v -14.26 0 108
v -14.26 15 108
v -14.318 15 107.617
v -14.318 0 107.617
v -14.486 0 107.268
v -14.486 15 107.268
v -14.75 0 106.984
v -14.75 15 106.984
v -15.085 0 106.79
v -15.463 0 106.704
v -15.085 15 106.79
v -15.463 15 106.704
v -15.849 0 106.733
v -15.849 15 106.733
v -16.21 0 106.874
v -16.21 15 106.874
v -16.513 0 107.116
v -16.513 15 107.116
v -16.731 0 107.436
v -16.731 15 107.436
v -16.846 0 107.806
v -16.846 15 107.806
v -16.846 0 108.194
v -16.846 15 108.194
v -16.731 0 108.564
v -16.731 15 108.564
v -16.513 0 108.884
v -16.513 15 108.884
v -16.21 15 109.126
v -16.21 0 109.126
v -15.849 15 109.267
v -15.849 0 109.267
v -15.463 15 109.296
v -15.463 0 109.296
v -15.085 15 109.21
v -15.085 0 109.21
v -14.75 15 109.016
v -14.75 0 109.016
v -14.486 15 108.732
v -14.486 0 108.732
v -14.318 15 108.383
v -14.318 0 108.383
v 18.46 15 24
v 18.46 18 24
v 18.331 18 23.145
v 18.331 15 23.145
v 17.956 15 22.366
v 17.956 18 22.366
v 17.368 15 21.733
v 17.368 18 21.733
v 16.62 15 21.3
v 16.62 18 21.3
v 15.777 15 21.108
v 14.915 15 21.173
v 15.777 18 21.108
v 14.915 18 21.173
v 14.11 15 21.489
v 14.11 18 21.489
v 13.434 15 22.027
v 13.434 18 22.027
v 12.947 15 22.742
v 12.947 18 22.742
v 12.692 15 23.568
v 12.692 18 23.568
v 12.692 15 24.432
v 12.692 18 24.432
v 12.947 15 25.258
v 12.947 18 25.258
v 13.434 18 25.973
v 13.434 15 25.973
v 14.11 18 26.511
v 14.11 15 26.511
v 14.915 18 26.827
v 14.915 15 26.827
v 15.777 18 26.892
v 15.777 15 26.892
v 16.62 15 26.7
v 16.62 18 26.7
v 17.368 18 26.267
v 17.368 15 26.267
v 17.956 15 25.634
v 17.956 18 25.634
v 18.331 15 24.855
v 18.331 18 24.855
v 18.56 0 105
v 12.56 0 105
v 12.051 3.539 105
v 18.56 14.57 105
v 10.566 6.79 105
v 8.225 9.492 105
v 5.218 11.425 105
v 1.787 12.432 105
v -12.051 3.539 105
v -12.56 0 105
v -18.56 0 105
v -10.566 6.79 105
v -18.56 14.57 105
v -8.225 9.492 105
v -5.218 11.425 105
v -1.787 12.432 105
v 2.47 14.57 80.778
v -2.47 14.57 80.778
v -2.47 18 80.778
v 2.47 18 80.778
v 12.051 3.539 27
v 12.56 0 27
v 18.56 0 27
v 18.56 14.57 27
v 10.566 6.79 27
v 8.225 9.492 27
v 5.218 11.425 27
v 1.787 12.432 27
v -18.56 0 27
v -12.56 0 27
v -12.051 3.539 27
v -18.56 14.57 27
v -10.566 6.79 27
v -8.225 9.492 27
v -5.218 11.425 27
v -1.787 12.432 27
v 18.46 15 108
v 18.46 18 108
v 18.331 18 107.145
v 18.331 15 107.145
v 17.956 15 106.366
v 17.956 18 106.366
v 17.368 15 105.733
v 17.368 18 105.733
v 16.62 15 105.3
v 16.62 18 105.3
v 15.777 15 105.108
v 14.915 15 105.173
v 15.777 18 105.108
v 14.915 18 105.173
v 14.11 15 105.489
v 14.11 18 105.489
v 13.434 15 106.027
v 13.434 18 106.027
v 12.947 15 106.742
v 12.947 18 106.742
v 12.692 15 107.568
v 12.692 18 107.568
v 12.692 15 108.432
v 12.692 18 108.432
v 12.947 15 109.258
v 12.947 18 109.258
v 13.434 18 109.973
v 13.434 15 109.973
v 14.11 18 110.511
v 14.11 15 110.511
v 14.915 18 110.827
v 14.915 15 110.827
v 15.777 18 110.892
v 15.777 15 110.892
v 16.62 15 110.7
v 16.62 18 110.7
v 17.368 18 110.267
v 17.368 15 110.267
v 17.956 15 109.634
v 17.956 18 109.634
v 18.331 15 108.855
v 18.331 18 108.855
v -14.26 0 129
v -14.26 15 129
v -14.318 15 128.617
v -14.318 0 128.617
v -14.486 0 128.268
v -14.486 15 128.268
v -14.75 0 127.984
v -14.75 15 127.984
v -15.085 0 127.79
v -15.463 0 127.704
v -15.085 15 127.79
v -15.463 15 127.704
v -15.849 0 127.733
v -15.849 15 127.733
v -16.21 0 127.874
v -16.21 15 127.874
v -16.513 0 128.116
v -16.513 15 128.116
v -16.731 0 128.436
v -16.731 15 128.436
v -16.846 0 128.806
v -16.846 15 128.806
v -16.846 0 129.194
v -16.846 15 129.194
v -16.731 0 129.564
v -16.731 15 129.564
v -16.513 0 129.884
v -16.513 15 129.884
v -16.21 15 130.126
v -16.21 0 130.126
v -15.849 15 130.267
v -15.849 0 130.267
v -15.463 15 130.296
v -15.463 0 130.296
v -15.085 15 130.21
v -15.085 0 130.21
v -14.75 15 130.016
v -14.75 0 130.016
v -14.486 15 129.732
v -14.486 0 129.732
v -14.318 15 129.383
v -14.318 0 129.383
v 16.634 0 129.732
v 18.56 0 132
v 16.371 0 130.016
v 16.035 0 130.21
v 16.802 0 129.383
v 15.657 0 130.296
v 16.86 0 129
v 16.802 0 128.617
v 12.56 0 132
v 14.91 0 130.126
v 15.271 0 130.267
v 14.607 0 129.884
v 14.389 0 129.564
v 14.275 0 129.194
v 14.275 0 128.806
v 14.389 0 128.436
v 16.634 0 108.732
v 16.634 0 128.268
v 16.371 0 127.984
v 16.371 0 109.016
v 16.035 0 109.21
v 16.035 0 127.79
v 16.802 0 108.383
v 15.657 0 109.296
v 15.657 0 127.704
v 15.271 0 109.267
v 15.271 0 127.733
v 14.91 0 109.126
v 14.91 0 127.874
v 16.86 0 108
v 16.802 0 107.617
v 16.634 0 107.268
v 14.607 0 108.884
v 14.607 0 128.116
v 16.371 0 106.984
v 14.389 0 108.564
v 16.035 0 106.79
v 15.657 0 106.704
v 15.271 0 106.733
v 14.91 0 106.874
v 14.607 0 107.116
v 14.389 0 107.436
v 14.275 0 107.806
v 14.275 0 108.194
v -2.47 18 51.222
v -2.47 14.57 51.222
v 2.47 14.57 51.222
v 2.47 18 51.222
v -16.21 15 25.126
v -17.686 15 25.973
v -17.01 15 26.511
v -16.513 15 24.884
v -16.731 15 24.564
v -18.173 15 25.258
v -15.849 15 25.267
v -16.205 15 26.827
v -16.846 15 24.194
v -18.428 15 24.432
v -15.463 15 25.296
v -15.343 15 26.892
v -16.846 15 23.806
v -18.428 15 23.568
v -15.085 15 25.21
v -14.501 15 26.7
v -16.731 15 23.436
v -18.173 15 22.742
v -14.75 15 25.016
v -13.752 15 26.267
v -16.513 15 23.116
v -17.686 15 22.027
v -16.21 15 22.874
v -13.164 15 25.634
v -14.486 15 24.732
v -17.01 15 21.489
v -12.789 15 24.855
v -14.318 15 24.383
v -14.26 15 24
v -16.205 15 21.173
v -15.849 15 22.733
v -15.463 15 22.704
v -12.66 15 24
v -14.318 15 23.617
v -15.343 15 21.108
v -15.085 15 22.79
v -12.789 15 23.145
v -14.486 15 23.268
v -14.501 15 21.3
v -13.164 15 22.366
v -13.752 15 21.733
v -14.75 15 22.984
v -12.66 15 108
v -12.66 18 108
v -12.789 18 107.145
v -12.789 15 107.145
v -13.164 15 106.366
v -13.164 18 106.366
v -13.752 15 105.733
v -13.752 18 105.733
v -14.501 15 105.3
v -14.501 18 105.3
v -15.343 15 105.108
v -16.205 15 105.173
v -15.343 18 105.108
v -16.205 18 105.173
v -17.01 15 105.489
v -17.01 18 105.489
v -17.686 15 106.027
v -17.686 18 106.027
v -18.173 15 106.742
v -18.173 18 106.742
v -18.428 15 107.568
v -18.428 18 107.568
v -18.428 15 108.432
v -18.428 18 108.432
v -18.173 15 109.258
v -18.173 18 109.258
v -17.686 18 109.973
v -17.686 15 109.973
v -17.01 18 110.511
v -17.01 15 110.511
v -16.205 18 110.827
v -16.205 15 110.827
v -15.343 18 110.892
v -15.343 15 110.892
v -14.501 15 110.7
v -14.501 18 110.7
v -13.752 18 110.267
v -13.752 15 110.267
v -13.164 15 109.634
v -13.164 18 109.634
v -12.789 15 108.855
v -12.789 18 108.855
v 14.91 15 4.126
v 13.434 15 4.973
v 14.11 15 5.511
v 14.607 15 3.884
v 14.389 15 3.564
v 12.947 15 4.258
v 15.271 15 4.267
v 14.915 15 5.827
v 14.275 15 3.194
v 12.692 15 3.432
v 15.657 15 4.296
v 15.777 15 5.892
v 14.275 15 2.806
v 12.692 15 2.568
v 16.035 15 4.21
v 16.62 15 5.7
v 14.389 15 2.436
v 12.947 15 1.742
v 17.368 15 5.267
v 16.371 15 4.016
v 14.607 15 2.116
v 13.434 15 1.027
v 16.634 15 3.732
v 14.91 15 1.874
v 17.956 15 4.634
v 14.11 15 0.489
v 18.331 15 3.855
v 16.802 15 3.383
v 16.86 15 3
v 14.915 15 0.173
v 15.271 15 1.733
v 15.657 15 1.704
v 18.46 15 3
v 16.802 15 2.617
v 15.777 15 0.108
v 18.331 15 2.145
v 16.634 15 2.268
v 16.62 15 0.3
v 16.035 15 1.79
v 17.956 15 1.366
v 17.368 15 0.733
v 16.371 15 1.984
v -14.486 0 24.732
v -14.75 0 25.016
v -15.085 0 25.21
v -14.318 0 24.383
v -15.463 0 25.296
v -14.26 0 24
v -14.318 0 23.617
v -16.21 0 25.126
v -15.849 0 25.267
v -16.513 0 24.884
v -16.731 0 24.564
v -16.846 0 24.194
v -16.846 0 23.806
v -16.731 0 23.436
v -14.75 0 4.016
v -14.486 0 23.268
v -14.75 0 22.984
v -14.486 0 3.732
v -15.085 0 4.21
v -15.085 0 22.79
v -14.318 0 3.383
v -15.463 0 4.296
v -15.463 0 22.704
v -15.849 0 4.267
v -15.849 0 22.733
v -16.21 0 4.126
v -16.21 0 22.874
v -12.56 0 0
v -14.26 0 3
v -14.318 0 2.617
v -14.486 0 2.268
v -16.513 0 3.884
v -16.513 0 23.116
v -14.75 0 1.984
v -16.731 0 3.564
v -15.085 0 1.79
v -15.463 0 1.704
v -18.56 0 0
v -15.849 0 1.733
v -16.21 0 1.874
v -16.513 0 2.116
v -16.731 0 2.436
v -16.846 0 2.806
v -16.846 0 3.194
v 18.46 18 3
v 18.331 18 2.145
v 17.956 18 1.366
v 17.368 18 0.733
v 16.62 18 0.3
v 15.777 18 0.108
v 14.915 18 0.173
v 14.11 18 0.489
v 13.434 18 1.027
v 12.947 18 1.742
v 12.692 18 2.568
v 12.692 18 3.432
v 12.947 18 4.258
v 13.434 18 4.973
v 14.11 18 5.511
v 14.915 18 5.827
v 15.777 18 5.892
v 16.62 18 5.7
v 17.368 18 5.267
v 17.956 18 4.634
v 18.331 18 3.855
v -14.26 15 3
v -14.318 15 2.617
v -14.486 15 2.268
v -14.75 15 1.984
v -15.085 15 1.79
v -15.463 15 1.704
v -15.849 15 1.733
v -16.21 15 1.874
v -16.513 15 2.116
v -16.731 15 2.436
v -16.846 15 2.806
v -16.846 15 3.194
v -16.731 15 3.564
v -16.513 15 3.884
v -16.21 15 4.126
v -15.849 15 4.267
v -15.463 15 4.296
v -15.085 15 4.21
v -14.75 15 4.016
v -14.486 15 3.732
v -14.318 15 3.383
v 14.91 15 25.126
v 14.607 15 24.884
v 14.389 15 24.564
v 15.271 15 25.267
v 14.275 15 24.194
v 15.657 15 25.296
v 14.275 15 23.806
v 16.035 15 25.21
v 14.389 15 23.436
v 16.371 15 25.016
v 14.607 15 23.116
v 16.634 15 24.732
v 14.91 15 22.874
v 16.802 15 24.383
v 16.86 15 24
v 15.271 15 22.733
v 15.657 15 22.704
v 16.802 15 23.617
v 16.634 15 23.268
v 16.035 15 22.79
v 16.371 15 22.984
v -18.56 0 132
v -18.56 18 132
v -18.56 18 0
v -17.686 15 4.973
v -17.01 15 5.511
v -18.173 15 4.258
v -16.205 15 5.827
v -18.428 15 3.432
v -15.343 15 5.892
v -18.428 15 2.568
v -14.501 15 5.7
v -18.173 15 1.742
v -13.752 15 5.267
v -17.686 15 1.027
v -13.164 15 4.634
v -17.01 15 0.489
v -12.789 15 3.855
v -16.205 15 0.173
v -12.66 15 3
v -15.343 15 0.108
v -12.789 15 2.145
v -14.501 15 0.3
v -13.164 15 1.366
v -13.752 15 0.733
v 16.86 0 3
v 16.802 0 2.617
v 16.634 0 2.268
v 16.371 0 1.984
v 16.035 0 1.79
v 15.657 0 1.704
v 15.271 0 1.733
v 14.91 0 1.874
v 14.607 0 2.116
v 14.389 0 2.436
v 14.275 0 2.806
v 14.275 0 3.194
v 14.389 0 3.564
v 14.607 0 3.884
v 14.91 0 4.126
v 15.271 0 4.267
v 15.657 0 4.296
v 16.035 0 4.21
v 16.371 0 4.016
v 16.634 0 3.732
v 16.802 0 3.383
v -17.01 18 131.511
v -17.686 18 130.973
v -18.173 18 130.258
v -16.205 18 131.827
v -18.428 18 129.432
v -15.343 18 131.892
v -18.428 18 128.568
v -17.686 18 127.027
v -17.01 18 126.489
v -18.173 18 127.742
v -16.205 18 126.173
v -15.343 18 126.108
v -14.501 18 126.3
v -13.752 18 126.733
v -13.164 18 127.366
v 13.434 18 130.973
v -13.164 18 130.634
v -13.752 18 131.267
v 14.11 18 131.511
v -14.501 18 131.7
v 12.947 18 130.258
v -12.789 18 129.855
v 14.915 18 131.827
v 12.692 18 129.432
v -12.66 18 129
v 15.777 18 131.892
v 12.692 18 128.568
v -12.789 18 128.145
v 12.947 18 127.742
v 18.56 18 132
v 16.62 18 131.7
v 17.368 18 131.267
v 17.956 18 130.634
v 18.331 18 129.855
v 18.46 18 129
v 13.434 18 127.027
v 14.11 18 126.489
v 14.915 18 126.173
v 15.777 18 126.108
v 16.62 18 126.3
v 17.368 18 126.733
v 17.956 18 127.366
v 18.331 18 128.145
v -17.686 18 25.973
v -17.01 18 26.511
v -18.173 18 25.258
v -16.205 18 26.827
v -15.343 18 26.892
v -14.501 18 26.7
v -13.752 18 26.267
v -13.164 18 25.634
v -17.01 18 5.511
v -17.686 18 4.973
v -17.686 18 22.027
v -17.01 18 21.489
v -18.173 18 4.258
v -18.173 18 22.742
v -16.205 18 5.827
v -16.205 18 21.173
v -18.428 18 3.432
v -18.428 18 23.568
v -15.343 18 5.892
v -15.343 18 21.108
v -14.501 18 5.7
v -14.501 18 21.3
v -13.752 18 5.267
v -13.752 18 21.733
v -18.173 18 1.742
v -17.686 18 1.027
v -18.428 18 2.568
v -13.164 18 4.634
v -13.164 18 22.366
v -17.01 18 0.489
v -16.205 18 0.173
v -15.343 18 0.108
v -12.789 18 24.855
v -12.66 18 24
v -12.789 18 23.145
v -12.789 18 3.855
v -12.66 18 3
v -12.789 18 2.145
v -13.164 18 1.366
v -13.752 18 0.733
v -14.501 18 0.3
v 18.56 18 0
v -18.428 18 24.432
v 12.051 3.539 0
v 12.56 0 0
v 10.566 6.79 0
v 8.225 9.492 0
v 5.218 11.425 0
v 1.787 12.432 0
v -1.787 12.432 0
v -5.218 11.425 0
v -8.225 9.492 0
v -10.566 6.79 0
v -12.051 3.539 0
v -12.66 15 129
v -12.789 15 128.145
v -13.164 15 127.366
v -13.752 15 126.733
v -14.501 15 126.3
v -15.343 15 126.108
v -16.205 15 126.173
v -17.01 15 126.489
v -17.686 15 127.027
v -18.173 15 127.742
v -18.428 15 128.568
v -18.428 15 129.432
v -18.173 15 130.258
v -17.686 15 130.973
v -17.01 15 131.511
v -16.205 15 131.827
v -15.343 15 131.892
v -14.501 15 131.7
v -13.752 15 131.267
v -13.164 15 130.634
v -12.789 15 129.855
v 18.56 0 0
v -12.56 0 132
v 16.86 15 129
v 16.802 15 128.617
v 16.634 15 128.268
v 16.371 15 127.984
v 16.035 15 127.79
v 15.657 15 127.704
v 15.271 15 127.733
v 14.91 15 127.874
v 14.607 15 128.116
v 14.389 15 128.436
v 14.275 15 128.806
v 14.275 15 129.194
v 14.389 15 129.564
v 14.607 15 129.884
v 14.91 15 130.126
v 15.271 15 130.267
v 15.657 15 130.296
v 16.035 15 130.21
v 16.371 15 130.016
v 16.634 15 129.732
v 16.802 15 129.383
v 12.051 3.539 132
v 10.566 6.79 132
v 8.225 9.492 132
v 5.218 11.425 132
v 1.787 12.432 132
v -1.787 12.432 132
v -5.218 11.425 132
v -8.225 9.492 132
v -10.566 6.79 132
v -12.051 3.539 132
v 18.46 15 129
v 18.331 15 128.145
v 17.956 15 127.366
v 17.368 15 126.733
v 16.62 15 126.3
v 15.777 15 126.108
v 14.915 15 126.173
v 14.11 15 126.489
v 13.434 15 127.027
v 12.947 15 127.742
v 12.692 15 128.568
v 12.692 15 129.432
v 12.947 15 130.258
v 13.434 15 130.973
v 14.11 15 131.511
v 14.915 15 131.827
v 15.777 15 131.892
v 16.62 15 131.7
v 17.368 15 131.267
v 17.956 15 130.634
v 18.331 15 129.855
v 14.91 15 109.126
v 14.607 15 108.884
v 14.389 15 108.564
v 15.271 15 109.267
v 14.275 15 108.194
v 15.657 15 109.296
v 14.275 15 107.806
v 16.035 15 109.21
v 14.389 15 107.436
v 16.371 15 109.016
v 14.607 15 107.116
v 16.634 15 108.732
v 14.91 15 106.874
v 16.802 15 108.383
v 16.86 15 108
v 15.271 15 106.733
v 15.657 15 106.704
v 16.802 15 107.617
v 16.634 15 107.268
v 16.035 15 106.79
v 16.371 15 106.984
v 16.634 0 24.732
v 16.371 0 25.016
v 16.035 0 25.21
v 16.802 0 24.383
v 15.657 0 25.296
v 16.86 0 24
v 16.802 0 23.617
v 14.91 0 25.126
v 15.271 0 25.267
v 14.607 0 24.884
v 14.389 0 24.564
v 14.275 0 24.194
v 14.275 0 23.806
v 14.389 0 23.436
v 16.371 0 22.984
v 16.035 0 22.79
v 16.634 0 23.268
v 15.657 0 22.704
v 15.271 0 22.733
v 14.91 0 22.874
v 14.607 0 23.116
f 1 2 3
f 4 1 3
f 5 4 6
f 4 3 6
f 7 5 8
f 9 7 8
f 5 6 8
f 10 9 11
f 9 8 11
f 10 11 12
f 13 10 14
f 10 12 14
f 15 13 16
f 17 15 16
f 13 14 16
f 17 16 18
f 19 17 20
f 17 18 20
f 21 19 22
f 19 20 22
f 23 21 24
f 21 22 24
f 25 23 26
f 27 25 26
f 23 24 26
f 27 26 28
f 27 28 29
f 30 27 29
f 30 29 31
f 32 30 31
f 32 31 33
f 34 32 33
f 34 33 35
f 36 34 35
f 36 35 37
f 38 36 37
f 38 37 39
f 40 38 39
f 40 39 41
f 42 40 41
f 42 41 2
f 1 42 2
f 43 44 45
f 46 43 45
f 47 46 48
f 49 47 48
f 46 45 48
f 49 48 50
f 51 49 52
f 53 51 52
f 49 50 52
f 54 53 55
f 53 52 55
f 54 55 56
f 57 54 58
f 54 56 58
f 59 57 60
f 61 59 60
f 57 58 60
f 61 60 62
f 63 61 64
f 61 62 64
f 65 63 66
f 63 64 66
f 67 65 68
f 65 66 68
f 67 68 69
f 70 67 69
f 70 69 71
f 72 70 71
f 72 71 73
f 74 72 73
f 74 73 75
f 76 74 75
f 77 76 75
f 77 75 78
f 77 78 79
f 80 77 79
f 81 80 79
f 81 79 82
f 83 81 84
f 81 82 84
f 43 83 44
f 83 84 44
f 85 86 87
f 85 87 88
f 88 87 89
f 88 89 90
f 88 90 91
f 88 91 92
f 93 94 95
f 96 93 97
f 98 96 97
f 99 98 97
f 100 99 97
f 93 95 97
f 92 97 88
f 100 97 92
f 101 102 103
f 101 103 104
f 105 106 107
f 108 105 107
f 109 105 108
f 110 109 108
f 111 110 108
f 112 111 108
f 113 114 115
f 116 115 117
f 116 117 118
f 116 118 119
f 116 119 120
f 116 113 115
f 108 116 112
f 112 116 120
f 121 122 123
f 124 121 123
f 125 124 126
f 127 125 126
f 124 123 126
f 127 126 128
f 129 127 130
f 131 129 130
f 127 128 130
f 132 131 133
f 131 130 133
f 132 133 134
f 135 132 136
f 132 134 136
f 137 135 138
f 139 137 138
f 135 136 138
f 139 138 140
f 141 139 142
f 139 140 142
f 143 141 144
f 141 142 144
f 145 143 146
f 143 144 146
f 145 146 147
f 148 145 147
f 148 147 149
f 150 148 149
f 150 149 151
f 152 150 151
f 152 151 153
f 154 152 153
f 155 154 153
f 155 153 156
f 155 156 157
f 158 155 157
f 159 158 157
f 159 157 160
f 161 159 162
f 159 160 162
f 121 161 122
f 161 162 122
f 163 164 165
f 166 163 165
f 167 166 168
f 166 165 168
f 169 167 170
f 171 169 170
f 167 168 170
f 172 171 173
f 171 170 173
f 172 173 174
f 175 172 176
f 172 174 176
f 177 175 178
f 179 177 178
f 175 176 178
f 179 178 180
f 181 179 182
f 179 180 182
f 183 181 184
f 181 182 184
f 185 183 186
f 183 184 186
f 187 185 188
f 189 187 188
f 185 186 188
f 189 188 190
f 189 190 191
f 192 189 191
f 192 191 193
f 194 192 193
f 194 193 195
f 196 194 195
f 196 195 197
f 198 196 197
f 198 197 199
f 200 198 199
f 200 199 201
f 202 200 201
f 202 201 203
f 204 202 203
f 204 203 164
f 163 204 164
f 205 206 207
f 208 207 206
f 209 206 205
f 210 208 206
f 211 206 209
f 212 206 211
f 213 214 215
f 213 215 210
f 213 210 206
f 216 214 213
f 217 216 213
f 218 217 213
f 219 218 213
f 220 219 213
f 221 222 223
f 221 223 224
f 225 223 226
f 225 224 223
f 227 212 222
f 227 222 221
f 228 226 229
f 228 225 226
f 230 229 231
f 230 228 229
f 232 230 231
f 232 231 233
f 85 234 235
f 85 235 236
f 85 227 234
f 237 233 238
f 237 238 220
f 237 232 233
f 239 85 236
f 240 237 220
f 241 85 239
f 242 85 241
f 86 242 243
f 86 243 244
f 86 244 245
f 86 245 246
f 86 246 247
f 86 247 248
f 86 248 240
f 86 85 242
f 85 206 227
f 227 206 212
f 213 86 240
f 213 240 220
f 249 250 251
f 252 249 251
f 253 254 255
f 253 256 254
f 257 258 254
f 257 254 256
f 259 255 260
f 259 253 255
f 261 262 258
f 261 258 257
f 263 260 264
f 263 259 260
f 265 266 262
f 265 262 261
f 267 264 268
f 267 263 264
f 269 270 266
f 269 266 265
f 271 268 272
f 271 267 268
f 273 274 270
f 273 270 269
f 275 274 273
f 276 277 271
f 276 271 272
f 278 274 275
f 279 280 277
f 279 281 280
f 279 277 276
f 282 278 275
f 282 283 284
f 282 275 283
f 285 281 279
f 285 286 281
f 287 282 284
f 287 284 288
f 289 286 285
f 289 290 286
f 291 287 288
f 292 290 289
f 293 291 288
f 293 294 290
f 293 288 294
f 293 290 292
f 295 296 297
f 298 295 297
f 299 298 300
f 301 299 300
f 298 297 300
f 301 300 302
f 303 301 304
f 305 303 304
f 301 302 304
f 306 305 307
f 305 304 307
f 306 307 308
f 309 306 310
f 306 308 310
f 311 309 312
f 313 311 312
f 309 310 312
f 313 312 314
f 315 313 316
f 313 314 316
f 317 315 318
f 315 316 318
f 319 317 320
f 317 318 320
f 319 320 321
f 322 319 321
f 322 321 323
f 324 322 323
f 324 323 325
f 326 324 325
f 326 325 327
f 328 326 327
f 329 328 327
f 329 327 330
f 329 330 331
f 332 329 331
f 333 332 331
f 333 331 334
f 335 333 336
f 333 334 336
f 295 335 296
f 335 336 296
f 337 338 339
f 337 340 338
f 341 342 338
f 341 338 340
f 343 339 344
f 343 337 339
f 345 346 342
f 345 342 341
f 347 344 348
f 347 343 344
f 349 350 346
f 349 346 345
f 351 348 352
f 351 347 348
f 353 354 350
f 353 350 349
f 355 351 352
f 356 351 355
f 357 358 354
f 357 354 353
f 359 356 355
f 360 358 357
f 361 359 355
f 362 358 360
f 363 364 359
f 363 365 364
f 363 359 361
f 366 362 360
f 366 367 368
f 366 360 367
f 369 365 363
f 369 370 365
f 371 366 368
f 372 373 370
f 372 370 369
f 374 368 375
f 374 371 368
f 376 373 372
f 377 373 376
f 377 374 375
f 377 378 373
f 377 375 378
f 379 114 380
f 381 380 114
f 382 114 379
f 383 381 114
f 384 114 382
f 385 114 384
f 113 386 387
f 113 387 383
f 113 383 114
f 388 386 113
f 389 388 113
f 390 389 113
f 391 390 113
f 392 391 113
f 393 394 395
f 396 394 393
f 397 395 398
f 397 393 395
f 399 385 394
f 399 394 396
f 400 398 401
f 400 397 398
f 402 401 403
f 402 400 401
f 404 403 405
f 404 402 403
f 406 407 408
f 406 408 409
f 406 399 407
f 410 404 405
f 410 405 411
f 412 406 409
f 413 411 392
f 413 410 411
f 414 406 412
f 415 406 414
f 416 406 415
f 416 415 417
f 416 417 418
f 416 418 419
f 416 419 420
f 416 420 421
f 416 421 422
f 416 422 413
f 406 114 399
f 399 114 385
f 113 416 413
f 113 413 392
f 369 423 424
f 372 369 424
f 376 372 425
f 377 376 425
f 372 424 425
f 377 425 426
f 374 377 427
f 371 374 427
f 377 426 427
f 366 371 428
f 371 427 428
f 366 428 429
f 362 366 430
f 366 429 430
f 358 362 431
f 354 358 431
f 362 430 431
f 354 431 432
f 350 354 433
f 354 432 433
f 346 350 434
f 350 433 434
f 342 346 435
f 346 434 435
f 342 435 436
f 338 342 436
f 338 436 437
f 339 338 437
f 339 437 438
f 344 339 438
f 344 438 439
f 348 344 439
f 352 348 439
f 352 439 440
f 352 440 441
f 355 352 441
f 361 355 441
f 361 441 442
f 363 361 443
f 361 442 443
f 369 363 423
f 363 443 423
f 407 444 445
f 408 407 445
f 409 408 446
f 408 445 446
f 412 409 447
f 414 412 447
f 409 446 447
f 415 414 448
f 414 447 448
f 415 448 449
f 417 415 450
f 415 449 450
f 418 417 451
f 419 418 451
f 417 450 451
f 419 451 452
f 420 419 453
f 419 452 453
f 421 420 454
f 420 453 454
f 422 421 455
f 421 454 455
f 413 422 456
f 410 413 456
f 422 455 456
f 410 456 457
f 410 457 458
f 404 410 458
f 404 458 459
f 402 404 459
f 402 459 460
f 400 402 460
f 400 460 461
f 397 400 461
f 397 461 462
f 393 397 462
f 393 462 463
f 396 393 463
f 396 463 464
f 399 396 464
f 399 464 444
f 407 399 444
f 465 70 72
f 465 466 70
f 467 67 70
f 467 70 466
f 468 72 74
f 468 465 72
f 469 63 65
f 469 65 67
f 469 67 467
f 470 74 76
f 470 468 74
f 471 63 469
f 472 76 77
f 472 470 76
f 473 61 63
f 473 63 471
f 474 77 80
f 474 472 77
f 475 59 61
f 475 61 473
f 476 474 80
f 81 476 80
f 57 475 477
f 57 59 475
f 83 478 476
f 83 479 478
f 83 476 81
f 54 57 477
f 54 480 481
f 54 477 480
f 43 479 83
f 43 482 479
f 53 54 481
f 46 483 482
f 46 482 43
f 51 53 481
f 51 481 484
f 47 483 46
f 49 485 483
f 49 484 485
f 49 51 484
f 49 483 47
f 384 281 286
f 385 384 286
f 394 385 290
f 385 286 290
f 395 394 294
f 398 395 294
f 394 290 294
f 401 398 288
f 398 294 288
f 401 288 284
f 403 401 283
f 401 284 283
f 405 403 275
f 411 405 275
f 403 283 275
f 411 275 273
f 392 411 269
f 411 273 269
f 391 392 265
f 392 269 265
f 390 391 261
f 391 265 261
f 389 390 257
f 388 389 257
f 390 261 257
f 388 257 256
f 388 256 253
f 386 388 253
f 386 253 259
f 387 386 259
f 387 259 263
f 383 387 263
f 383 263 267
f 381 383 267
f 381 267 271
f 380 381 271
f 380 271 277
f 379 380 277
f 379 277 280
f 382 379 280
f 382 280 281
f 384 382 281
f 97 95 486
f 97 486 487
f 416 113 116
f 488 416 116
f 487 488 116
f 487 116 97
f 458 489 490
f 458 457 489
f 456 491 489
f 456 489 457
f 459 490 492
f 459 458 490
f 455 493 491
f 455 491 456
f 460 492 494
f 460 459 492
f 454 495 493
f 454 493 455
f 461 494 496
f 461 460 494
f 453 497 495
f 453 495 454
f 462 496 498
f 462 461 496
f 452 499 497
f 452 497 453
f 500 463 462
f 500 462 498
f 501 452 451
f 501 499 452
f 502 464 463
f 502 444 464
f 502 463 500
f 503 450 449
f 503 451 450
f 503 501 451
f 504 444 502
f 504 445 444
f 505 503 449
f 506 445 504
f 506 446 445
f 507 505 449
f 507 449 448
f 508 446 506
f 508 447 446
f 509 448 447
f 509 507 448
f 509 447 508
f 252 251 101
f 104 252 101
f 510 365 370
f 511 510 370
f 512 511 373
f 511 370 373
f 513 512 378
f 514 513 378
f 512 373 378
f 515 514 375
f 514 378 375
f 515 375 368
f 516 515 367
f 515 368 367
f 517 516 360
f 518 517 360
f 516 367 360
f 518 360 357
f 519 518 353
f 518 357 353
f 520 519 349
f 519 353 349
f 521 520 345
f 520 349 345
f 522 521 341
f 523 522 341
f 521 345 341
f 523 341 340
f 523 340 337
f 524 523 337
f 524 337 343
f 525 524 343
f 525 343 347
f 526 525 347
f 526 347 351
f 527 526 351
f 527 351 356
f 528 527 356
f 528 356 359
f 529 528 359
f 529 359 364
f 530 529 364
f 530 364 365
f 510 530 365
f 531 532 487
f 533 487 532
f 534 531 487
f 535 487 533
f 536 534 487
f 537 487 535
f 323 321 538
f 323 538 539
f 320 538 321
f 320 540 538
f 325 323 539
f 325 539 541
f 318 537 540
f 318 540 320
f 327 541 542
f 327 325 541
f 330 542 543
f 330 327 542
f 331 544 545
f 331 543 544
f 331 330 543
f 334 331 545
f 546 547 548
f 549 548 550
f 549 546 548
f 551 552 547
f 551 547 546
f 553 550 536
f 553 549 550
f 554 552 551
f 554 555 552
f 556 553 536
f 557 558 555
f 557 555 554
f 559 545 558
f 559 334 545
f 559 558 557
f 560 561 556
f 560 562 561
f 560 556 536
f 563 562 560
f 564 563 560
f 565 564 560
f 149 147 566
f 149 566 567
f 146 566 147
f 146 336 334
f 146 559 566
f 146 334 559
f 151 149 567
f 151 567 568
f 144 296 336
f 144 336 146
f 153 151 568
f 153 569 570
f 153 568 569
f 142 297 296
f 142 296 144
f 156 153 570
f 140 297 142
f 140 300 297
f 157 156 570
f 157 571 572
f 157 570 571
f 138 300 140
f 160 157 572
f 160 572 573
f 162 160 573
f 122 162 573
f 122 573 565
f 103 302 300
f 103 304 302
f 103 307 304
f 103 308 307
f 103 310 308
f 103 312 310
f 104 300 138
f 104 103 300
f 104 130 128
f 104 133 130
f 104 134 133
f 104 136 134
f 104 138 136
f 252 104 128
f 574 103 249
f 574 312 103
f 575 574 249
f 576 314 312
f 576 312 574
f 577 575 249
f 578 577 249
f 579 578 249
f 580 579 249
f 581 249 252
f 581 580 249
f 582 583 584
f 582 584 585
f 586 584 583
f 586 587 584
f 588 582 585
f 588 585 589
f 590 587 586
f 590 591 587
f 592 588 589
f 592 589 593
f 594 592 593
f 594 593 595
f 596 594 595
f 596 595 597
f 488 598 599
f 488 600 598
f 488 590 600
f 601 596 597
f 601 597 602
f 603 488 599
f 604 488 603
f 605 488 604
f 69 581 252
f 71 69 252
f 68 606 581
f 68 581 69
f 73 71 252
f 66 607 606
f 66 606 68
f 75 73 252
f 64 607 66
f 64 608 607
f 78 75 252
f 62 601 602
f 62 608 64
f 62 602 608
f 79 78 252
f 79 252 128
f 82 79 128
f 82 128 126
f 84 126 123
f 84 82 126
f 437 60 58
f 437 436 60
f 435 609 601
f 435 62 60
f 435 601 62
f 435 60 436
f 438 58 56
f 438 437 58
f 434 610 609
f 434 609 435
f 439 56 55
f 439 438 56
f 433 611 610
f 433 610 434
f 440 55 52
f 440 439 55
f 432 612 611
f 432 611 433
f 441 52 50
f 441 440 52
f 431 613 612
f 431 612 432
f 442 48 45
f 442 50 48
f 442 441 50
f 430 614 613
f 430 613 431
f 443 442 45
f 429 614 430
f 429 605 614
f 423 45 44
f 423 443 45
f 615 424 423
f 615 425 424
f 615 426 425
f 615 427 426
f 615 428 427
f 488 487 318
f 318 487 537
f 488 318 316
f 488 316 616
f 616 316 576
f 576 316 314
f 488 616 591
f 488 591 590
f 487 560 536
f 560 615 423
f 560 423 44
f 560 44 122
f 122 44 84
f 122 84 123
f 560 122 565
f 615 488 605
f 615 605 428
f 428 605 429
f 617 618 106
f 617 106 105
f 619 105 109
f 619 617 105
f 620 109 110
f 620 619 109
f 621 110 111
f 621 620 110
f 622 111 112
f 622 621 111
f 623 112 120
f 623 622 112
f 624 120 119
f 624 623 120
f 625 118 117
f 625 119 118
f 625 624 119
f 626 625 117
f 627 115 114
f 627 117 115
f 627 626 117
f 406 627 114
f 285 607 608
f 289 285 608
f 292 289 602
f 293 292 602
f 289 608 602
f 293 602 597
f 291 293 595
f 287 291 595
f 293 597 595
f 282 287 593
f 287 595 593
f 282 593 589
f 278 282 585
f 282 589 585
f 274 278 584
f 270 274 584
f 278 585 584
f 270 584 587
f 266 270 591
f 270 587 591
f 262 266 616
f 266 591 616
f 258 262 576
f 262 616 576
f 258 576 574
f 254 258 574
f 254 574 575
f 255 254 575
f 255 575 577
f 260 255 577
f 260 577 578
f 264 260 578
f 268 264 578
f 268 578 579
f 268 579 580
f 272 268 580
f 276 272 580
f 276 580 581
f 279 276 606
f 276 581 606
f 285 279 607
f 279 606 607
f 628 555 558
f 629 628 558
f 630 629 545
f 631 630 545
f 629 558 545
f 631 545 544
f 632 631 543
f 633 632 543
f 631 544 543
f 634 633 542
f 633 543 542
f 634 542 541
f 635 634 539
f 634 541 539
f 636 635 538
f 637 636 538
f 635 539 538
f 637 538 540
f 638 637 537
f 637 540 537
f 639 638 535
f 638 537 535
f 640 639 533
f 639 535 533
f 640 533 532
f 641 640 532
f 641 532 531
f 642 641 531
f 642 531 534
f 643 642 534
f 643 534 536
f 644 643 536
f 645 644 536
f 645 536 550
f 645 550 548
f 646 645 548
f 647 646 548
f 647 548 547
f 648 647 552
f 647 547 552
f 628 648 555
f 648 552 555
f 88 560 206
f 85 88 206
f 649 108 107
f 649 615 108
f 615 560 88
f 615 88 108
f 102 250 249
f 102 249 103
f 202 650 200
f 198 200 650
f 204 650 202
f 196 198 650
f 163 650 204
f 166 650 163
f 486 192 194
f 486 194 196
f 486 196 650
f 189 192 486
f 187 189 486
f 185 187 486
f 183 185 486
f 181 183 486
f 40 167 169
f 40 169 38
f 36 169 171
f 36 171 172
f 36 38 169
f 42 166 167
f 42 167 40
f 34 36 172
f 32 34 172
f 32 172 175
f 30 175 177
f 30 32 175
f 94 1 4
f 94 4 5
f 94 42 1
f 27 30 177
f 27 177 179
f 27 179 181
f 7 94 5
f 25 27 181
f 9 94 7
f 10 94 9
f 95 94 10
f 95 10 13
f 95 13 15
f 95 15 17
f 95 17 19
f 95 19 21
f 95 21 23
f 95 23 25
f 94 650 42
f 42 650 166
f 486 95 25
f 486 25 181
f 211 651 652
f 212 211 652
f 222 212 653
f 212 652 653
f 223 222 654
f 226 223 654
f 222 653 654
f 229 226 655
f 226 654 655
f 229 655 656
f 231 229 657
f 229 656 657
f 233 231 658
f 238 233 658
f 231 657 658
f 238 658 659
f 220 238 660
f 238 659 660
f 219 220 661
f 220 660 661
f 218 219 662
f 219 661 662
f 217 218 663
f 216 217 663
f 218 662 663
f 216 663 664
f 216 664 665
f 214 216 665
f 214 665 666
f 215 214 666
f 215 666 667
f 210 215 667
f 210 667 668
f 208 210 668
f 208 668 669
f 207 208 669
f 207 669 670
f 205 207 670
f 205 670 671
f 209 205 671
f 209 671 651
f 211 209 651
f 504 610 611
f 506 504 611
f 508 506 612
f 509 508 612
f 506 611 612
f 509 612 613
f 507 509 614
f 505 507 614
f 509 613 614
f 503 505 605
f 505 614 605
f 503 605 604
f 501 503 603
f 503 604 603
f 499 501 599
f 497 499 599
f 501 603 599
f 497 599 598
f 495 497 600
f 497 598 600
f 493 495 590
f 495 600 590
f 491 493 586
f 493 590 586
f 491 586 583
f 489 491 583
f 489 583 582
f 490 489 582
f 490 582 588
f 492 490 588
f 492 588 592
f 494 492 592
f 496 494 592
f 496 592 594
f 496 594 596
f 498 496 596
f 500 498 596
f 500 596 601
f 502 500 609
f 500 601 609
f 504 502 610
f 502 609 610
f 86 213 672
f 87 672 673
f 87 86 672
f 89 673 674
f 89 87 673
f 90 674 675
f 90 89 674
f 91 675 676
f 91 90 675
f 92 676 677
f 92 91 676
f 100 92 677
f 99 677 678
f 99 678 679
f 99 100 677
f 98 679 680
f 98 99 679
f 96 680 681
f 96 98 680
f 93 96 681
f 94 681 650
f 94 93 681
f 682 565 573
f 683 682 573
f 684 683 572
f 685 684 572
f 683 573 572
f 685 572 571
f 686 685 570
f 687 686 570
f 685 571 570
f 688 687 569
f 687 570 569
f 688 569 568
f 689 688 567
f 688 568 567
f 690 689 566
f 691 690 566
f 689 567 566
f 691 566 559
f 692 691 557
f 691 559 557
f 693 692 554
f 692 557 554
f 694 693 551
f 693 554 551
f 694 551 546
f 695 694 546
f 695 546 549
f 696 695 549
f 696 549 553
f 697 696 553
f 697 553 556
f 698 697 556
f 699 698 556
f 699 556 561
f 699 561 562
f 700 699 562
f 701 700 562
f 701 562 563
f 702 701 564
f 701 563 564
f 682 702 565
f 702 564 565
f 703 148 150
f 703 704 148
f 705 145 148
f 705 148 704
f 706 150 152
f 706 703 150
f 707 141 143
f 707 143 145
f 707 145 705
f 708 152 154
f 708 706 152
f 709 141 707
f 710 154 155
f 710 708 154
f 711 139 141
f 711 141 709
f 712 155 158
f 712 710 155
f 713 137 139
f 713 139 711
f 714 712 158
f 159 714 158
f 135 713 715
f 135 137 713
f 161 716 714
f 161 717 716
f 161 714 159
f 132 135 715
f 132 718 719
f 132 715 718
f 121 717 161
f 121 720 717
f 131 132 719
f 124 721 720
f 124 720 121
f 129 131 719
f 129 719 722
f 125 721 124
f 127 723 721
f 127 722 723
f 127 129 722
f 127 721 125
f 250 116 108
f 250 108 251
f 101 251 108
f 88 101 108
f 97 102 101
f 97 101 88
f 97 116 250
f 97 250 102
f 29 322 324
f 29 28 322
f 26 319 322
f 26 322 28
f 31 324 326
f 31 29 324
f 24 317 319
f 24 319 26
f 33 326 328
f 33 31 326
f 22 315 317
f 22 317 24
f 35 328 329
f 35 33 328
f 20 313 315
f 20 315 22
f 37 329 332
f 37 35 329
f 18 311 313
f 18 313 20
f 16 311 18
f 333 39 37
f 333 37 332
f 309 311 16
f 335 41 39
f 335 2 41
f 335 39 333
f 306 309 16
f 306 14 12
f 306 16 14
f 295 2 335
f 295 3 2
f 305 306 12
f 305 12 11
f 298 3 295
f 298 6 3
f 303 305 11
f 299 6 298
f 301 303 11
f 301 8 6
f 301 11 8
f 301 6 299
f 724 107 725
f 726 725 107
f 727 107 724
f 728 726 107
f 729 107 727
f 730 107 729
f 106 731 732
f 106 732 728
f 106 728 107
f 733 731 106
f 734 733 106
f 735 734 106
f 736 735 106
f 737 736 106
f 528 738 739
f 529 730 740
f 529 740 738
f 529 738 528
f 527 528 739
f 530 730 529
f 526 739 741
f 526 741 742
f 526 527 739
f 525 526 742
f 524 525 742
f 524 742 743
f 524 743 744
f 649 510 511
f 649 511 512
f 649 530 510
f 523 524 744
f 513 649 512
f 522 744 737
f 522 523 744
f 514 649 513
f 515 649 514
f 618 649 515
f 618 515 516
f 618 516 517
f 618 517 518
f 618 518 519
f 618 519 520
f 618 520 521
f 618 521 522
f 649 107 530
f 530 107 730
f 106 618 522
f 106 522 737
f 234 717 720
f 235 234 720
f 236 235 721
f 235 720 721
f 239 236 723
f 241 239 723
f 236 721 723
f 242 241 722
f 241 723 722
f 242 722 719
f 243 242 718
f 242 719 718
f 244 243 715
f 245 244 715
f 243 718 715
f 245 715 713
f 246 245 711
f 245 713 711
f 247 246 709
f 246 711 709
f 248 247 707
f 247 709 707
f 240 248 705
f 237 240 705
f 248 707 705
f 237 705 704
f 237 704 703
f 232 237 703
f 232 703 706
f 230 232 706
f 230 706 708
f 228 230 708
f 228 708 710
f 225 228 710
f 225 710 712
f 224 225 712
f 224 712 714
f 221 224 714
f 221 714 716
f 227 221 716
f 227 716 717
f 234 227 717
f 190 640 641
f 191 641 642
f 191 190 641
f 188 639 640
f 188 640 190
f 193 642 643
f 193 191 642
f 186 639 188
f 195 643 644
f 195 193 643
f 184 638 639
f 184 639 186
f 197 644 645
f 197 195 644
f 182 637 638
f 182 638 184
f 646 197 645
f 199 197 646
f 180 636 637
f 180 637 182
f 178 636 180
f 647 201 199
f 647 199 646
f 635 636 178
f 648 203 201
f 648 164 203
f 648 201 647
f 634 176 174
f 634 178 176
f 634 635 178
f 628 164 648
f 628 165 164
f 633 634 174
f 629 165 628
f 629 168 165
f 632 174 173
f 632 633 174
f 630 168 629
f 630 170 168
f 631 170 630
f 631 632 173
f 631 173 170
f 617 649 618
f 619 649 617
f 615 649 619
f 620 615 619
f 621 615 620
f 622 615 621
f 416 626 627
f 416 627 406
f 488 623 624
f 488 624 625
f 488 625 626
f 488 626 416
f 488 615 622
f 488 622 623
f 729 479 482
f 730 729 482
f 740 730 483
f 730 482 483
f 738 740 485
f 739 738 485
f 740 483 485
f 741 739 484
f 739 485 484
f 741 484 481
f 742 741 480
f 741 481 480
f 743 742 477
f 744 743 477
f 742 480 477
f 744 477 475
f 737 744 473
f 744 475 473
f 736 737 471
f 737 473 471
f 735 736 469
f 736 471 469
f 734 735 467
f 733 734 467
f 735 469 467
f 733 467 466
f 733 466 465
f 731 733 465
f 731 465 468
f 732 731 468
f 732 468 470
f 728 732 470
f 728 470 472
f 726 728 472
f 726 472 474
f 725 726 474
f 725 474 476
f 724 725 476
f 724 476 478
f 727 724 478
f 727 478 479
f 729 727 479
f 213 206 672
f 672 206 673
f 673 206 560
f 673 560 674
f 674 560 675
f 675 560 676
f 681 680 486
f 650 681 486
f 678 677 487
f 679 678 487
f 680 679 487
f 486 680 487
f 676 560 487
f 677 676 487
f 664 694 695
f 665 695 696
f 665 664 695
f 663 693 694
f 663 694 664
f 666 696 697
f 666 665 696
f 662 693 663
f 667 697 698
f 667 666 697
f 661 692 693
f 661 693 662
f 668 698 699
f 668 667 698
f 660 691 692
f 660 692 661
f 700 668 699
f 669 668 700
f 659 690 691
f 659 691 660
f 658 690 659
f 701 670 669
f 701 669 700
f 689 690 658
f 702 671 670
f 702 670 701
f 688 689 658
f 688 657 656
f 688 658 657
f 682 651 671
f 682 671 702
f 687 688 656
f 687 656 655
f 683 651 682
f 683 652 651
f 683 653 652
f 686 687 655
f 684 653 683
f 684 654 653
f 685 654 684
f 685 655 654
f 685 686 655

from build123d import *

# Parameters (mm, degrees)
BOSS_EXTRU_1_DEPTH      = 132
ESQUISSE2_W             = 78
ESQUISSE2_H             = 14.57
ENL_V_MAT_EXTRU_1_DEPTH = 132
ESQUISSE3_W             = 4.94012132
ESQUISSE3_H             = 29.556292602
ENL_V_MAT_EXTRU_2_DEPTH = 4
ESQUISSE4_R             = 1.3
ENL_V_MAT_EXTRU_3_DEPTH = 18
ESQUISSE6_R             = 2.9
ENL_V_MAT_EXTRU_5_DEPTH = 3


with BuildPart() as part:
    # Esquisse1 → Boss.-Extru.1 (new body)
    with BuildSketch(Plane.XY):
        with BuildLine():
            Line((-12.560062385, 0), (-18.560062385, 0))
            Line((-18.560062385, 0), (-18.560062385, 18))
            Line((-18.560062385, 18), (18.560062385, 18))
            Line((18.560062385, 18), (18.560062385, 0))
            Line((18.560062385, 0), (12.560062385, 0))
            ThreePointArc((12.560062385, 0), (0, 12.560062385), (-12.560062385, 0))
        make_face()
    extrude(amount=BOSS_EXTRU_1_DEPTH)

    # Esquisse2 → Enlèv. mat.-Extru.1 (cut)
    with BuildSketch(Plane.ZY.offset(18.560062385)):
        with Locations((66, 7.285)):
            Rectangle(ESQUISSE2_W, ESQUISSE2_H)
    extrude(amount=-ENL_V_MAT_EXTRU_1_DEPTH, mode=Mode.SUBTRACT)

    # Esquisse3 → Enlèv. mat.-Extru.2 (cut)
    with BuildSketch(Plane.XZ.offset(-14.57)):
        with Locations((0, 66)):
            Rectangle(ESQUISSE3_W, ESQUISSE3_H)
    extrude(amount=-ENL_V_MAT_EXTRU_2_DEPTH, mode=Mode.SUBTRACT)

    # Esquisse4 → Enlèv. mat.-Extru.3 (cut)
    with BuildSketch(Plane(origin=(0, 18, 0), x_dir=(1, 0, 0), z_dir=(0, 1, 0))):
        with Locations((15.560062385, -3)):
            Circle(ESQUISSE4_R)
        with Locations((15.560062385, -24)):
            Circle(ESQUISSE4_R)
        with Locations((-15.560062385, -3)):
            Circle(ESQUISSE4_R)
        with Locations((-15.560062385, -24)):
            Circle(ESQUISSE4_R)
        with Locations((-15.560062385, -108)):
            Circle(ESQUISSE4_R)
        with Locations((-15.560062385, -129)):
            Circle(ESQUISSE4_R)
        with Locations((15.560062385, -108)):
            Circle(ESQUISSE4_R)
        with Locations((15.560062385, -129)):
            Circle(ESQUISSE4_R)
    extrude(amount=-ENL_V_MAT_EXTRU_3_DEPTH, mode=Mode.SUBTRACT)

    # Esquisse6 → Enlèv. mat.-Extru.5 (cut)
    with BuildSketch(Plane(origin=(0, 18, 0), x_dir=(1, 0, 0), z_dir=(0, 1, 0))):
        with Locations((15.560062385, -3)):
            Circle(ESQUISSE6_R)
        with Locations((15.560062385, -24)):
            Circle(ESQUISSE6_R)
        with Locations((-15.560062385, -3)):
            Circle(ESQUISSE6_R)
        with Locations((-15.560062385, -24)):
            Circle(ESQUISSE6_R)
        with Locations((-15.560062385, -108)):
            Circle(ESQUISSE6_R)
        with Locations((-15.560062385, -129)):
            Circle(ESQUISSE6_R)
        with Locations((15.560062385, -108)):
            Circle(ESQUISSE6_R)
        with Locations((15.560062385, -129)):
            Circle(ESQUISSE6_R)
    extrude(amount=-ENL_V_MAT_EXTRU_5_DEPTH, mode=Mode.SUBTRACT)


solid = part.part
